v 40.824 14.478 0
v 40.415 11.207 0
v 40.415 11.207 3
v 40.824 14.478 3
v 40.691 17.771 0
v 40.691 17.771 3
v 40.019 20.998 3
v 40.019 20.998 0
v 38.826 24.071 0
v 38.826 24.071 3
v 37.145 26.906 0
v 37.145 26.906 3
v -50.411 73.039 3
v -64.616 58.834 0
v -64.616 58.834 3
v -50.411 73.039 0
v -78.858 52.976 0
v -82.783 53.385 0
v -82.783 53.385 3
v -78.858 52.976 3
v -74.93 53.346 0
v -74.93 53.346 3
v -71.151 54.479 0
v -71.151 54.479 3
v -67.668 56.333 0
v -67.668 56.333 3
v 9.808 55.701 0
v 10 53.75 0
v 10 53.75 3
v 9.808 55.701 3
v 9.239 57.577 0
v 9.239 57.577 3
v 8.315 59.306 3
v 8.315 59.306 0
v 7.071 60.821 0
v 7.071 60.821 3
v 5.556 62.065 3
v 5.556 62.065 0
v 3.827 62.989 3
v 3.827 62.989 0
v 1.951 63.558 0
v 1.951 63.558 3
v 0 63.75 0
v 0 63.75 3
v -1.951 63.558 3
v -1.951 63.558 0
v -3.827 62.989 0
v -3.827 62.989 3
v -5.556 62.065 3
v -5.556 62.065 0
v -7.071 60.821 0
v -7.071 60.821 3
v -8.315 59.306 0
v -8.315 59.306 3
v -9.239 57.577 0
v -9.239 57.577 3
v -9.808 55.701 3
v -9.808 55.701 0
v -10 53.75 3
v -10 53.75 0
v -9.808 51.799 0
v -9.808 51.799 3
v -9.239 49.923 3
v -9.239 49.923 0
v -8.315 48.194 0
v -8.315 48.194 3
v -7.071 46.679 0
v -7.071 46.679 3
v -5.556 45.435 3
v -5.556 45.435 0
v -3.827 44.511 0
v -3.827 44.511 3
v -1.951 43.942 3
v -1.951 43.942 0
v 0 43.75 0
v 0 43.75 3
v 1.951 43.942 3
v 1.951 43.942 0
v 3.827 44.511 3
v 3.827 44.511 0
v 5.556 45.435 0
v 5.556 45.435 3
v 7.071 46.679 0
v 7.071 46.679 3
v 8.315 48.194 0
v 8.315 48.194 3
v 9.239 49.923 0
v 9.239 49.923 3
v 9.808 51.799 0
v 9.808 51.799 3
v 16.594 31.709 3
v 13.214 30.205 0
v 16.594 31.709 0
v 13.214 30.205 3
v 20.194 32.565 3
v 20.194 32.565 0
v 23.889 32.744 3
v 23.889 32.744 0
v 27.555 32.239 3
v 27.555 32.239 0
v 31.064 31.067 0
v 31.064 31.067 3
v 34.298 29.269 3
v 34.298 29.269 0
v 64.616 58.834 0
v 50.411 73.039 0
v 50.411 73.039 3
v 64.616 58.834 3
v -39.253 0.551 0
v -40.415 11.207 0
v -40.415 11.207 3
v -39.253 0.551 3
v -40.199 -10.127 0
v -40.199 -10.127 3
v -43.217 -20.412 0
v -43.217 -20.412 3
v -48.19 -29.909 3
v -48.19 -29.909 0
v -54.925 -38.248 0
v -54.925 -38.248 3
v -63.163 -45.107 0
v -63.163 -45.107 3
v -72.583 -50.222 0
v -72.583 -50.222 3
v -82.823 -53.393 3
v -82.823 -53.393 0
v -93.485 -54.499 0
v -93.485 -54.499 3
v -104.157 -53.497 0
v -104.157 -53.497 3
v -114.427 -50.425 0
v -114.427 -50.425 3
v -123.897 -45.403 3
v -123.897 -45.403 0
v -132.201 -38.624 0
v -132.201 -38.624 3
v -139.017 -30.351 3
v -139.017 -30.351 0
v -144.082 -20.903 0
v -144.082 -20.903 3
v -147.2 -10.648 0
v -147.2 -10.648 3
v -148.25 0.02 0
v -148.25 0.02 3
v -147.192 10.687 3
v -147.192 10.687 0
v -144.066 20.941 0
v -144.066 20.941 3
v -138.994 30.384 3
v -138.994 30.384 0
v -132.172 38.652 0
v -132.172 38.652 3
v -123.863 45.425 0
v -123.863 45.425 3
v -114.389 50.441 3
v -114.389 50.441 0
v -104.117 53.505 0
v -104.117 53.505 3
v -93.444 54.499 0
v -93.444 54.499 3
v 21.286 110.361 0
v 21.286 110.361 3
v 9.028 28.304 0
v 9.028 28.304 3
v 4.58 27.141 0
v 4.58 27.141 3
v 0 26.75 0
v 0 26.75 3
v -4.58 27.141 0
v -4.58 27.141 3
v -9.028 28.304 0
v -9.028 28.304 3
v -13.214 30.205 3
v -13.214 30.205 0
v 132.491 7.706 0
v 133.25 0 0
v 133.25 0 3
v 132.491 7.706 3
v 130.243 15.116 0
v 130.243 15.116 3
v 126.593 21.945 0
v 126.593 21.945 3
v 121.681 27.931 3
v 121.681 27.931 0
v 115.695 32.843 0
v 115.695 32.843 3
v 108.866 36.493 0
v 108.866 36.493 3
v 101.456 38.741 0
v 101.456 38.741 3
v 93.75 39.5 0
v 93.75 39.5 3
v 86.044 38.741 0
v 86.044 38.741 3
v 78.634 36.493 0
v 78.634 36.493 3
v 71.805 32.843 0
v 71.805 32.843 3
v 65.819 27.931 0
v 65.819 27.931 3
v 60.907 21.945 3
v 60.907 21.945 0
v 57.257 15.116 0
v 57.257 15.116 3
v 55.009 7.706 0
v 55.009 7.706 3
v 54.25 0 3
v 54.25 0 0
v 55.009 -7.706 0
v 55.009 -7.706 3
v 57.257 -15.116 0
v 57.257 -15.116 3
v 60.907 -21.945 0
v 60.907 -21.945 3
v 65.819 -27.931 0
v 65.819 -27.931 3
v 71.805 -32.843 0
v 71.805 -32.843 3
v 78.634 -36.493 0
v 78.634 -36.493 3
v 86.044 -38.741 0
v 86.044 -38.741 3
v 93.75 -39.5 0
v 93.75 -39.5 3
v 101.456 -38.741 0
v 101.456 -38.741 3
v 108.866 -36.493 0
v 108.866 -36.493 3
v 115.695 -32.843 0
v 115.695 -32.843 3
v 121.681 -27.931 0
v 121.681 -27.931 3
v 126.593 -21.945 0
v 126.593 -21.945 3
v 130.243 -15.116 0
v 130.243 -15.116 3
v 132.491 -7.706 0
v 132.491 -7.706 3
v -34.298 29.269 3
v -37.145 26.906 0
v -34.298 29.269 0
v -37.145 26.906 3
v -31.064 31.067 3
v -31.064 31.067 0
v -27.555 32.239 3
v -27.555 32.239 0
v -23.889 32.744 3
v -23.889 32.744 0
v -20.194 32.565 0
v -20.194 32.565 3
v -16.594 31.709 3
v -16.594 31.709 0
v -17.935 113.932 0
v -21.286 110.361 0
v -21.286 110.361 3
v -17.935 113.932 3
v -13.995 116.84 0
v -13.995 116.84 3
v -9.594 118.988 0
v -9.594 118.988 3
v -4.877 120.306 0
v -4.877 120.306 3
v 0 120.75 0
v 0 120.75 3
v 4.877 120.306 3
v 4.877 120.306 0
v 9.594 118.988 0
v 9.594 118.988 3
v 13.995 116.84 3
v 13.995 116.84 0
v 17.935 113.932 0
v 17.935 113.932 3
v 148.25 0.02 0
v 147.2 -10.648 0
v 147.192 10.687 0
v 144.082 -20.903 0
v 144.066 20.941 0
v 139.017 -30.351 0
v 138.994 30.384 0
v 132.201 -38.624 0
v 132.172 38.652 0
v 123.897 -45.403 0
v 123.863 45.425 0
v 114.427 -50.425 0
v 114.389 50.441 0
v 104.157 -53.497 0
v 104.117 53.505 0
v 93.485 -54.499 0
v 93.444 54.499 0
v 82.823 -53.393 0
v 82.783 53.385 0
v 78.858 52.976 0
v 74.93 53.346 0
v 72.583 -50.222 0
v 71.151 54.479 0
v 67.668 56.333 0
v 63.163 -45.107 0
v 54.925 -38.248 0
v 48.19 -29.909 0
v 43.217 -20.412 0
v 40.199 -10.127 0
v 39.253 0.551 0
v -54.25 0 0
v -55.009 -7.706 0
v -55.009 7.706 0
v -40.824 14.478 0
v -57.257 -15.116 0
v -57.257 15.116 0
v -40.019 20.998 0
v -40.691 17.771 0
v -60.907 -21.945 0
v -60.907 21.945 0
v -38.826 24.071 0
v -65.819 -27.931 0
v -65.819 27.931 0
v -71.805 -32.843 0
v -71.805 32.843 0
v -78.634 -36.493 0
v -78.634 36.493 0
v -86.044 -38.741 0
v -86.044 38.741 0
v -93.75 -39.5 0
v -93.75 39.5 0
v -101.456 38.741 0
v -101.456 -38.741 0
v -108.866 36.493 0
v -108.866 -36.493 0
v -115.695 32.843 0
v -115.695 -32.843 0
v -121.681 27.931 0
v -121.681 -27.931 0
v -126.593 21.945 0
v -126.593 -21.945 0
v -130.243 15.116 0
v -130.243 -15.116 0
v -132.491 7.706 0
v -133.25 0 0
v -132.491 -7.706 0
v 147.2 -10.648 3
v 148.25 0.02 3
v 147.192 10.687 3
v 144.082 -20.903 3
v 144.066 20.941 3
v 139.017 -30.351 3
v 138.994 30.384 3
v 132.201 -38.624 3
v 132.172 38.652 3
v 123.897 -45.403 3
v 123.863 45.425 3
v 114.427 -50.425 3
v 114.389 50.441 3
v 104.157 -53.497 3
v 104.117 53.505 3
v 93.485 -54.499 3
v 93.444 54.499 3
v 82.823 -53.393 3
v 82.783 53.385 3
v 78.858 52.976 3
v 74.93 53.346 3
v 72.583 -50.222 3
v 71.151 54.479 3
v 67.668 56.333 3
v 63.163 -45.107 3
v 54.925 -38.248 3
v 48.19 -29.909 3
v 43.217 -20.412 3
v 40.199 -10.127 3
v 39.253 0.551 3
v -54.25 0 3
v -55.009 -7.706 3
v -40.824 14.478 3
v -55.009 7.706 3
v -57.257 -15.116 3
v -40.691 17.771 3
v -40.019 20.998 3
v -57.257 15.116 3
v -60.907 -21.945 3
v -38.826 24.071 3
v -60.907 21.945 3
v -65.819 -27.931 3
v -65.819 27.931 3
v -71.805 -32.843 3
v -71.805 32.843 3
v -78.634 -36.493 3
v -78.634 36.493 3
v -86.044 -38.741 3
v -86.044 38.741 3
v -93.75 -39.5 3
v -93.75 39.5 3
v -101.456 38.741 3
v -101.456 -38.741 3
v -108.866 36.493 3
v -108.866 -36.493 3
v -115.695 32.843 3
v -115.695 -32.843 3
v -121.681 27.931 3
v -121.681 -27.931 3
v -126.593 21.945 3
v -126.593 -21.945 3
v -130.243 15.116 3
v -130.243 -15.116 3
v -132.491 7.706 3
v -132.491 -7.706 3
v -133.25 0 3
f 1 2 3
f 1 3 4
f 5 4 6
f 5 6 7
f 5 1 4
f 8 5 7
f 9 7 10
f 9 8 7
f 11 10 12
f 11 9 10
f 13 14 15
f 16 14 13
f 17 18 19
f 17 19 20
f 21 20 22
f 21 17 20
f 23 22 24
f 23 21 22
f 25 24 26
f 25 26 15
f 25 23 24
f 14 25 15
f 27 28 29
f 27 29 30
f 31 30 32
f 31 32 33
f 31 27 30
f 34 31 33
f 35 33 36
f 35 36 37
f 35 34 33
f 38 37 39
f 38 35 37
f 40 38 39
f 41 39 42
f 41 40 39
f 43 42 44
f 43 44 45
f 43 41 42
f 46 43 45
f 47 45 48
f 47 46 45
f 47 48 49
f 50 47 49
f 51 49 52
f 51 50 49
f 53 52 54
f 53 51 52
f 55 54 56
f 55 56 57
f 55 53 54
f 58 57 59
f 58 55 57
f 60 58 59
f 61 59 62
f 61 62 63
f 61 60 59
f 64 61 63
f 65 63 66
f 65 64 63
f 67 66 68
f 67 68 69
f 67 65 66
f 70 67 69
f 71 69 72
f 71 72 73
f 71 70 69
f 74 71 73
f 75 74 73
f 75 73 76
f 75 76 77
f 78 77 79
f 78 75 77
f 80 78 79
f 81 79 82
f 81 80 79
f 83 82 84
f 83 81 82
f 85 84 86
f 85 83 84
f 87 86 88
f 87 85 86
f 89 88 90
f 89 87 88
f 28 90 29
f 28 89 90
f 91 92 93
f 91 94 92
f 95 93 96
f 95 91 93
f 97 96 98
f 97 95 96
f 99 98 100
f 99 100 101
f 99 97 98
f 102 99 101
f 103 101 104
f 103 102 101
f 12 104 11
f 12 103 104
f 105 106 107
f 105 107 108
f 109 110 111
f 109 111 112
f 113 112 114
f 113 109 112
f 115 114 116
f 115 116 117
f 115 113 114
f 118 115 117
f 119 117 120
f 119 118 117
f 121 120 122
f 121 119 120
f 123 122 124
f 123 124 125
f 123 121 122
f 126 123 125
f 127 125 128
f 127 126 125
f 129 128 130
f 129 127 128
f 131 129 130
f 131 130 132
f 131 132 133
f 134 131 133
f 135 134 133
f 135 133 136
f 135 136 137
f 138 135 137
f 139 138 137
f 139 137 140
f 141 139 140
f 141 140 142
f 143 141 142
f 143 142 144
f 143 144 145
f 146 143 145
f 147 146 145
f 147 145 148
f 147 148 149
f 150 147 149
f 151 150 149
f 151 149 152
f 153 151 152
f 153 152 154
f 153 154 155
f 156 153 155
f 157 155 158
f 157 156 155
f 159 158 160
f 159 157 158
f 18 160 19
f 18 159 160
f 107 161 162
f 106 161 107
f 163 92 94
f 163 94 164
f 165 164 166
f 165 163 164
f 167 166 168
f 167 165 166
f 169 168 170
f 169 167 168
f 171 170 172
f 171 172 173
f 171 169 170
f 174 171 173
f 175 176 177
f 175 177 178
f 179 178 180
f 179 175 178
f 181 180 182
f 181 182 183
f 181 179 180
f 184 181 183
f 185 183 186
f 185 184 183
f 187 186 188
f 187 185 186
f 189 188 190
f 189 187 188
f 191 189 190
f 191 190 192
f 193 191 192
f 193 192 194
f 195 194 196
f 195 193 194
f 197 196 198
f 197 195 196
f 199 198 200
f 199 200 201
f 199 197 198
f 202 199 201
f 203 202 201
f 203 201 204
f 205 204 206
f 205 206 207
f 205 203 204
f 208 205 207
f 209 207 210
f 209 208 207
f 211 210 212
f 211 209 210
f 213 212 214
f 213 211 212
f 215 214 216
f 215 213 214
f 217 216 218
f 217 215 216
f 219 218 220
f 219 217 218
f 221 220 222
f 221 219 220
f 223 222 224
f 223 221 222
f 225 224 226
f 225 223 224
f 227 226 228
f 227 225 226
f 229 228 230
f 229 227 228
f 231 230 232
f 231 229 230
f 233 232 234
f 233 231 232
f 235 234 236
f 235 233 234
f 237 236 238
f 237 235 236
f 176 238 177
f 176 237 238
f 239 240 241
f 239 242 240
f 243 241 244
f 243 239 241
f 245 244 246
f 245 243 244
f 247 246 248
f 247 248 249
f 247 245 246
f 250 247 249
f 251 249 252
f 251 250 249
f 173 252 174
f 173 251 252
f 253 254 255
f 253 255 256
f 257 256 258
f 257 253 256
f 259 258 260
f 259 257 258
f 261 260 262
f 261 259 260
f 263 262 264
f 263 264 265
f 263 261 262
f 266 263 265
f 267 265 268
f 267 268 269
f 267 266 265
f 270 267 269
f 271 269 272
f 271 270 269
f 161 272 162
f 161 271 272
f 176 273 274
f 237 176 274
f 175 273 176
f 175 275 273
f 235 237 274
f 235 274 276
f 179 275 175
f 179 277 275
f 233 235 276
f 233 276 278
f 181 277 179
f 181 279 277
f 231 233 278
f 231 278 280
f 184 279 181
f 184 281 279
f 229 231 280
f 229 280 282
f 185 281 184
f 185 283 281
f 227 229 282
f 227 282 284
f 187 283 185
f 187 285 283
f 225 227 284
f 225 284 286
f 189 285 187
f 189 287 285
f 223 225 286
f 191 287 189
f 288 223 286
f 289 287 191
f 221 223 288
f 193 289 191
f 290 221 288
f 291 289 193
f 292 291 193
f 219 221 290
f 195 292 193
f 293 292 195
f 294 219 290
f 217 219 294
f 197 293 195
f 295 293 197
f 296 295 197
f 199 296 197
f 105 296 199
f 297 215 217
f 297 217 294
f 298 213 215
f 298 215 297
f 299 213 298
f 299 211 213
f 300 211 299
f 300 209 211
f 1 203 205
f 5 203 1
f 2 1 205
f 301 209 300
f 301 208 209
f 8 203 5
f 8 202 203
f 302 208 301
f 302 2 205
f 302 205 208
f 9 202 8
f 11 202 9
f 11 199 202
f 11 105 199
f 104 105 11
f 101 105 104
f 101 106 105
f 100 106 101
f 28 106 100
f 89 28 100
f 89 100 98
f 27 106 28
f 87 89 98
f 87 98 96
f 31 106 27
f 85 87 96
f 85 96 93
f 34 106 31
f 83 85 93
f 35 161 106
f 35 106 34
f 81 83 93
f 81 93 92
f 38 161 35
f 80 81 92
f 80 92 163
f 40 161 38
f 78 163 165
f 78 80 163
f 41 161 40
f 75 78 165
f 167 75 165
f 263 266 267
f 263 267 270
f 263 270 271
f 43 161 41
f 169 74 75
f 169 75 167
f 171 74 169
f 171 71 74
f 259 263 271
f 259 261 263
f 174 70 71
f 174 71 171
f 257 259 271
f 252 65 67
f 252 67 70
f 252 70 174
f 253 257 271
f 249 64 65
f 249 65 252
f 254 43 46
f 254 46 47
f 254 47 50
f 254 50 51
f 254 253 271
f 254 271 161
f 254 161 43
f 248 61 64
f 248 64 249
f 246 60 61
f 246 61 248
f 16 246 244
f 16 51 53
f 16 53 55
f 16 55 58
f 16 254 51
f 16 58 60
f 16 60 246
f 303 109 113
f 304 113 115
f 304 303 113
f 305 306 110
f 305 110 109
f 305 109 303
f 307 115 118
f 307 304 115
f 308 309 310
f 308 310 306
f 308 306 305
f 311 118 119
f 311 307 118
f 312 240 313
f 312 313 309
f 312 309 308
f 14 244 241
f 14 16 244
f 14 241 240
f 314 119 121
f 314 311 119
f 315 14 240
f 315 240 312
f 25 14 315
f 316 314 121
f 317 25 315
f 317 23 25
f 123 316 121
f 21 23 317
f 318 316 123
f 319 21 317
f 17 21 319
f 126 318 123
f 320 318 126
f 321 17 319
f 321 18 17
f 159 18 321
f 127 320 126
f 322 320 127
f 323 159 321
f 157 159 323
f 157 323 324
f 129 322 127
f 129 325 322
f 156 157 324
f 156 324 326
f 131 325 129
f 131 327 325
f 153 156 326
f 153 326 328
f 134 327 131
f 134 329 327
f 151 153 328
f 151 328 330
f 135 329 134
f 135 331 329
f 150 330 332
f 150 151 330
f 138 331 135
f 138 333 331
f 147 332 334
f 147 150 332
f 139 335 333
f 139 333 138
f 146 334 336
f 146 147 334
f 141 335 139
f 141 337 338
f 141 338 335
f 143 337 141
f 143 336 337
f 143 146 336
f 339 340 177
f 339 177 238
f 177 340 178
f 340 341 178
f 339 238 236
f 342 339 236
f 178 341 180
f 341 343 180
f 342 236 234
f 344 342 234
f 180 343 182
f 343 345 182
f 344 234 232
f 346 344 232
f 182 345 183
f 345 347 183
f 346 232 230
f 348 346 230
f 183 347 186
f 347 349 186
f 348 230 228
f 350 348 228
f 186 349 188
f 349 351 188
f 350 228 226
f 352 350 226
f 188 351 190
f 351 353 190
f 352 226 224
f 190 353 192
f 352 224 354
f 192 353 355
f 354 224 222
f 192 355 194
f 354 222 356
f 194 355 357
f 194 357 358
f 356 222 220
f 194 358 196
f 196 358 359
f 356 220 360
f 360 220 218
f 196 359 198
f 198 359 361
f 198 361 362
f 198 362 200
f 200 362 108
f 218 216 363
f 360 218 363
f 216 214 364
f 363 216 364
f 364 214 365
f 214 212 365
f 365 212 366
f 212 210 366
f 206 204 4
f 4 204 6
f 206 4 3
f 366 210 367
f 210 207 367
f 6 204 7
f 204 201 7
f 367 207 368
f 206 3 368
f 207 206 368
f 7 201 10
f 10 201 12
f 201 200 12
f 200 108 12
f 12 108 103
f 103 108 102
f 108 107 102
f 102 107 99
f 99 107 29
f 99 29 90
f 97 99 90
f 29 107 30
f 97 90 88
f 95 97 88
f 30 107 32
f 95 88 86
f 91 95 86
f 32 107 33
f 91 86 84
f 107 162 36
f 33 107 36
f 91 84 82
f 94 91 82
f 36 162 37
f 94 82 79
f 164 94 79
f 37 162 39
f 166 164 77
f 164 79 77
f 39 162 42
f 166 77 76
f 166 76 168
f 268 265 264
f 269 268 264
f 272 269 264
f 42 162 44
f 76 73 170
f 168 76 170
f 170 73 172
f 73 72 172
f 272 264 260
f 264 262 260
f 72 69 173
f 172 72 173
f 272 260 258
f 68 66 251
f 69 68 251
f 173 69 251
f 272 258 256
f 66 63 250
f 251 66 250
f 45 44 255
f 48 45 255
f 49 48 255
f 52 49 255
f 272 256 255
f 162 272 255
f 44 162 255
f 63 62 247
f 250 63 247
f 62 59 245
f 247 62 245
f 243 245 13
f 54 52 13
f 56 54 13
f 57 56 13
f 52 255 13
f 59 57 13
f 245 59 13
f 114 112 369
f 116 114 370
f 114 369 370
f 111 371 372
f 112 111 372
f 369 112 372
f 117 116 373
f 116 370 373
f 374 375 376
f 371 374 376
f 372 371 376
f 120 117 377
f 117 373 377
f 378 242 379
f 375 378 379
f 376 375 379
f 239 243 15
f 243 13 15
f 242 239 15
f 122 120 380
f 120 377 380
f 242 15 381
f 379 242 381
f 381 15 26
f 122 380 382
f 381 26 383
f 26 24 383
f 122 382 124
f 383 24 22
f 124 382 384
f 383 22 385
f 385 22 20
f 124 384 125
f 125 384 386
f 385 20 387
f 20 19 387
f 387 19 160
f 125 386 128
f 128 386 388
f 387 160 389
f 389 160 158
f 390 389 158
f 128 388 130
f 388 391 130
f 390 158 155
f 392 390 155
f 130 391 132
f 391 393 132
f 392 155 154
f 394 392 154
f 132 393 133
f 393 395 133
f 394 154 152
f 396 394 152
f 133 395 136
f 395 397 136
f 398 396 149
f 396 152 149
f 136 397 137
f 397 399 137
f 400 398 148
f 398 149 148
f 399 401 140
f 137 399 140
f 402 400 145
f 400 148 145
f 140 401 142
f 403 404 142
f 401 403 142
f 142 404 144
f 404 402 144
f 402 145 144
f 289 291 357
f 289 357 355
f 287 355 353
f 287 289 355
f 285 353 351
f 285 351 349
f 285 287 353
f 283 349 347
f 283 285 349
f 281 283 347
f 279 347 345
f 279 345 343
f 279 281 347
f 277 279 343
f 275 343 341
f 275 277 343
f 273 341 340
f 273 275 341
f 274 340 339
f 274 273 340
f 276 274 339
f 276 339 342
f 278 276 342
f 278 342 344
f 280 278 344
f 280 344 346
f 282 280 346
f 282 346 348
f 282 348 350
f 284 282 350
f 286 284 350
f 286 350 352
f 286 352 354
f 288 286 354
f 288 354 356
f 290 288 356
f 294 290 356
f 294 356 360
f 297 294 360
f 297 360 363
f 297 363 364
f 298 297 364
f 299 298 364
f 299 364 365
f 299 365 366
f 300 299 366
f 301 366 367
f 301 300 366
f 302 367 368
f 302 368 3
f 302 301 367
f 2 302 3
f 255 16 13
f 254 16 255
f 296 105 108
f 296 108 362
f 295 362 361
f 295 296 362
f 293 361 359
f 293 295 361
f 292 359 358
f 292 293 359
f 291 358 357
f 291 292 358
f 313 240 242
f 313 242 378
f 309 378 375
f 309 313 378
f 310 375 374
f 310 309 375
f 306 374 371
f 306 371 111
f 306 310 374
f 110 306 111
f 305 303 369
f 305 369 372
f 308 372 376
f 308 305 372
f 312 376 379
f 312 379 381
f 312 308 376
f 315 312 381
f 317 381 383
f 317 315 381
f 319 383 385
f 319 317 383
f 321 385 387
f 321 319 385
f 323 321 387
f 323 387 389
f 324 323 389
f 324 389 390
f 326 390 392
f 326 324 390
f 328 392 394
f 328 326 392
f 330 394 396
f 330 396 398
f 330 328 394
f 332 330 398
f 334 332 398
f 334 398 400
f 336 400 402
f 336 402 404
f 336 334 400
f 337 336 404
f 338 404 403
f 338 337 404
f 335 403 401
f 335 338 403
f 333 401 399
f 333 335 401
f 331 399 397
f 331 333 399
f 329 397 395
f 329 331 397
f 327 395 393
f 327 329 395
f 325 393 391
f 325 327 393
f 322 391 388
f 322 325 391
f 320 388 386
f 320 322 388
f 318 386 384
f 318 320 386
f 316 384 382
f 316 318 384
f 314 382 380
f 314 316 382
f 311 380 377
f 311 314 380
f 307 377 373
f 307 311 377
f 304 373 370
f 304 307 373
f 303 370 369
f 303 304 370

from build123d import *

# Parameters (mm, degrees)
SKETCH_1_R      = 39.5
SKETCH_1_R_2    = 10
EXTRUDE_1_DEPTH = 3
FILLET_1_R      = 20
FILLET_2_R      = 20


with BuildPart() as part:
    # Эскиз1 → Бобышка-Вытянуть1 (new body)
    with BuildSketch(Plane.XY):
        with BuildLine():
            Line((-73.038609064, 50.411192066), (-50.411192066, 73.038609064))
            Line((-50.411192066, 73.038609064), (-21.285640845, 110.360884799))
            ThreePointArc((-21.285640845, 110.360884799), (0, 120.75), (21.285640845, 110.360884799))
            Line((21.285640845, 110.360884799), (50.411192066, 73.038609064))
            Line((50.411192066, 73.038609064), (73.038609064, 50.411192066))
            ThreePointArc((73.038609064, 50.411192066), (132.287319575, -38.537319575), (43.338807934, 20.711390936))
            Line((43.338807934, 20.711390936), (23.534235961, 40.515962909))
            ThreePointArc((23.534235961, 40.515962909), (0, 26.75), (-23.534235961, 40.515962909))
            Line((-23.534235961, 40.515962909), (-43.338807934, 20.711390936))
            ThreePointArc((-43.338807934, 20.711390936), (-132.287319575, -38.537319575), (-73.038609064, 50.411192066))
        make_face()
        with Locations((-93.75, 0)):
            Circle(SKETCH_1_R, mode=Mode.SUBTRACT)
        with Locations((93.75, 0)):
            Circle(SKETCH_1_R, mode=Mode.SUBTRACT)
        with Locations((0, 53.75)):
            Circle(SKETCH_1_R_2, mode=Mode.SUBTRACT)
    extrude(amount=EXTRUDE_1_DEPTH)

    # Скругление1
    fillet_1_edges = [part.edges().sort_by_distance(p)[0] for p in [
        (23.534235961, 40.515962909, 1.5),
        (-23.534235961, 40.515962909, 1.5),
    ]]
    fillet(fillet_1_edges, radius=FILLET_1_R)

    # Скругление2
    # the kernel refuses this fillet: 20 mm, written as the material it adds along each edge
    with BuildSketch(Plane(origin=(73.038609064, 50.411192066, 0), x_dir=(0.9564465824657693, 0.29190740807583243, 0), z_dir=(0, 0, 1))) as fillet_2_piece_1:
        with BuildLine():
            CenterArc((12.057212621, 19.912448006), FILLET_2_R, 208.027815678, 56.6091051)
            Line((-5.59717882, 10.514444874), (-5.950266649, 10.326484811))
            Line((-5.950266649, 10.326484811), (-0.353087829, -0.187960063))
            Line((-0.353087829, -0.187960063), (0.037386706, -0.39824896))
            ThreePointArc((0.037386706, -0.39824896), (5.093938665, -0.161420815), (10.150490625, -0.39824896))
            Line((10.150490625, -0.39824896), (10.187877331, 0))
        make_face()
    extrude(amount=3)
    with BuildSketch(Plane(origin=(-73.038609064, 50.411192066, 0), x_dir=(-0.9564465824657701, 0.2919074080758299, 0), z_dir=(0, 0, 1))) as fillet_2_piece_2:
        with BuildLine():
            CenterArc((12.057212621, -19.912448006), FILLET_2_R, 95.363079222, 56.6091051)
            Line((-5.59717882, -10.514444874), (-5.950266649, -10.326484811))
            Line((-5.950266649, -10.326484811), (-0.353087829, 0.187960063))
            Line((-0.353087829, 0.187960063), (0.037386706, 0.39824896))
            ThreePointArc((0.037386706, 0.39824896), (5.093938665, 0.161420815), (10.150490625, 0.39824896))
            Line((10.150490625, 0.39824896), (10.187877331, 0))
        make_face()
    extrude(amount=3)
    with BuildSketch(Plane(origin=(43.338807934, 20.711390936, 0), x_dir=(-0.7071067811865486, 0.7071067811865466, 0), z_dir=(0, 0, 1))) as fillet_2_piece_3:
        with BuildLine():
            CenterArc((12.095099349, 19.719973869), FILLET_2_R, 213.13333953, 47.267573146)
            Line((-4.652916781, 8.788187386), (-4.987877104, 8.569551657))
            ThreePointArc((-4.987877104, 8.569551657), (-2.479115111, 4.313269402), (-0.369110171, -0.154135272))
            Line((-0.369110171, -0.154135272), (0, -0.4))
            ThreePointArc((0, -0.4), (4.380019269, -0.4), (8.693337321, -0.394399477))
            Line((8.693337321, -0.394399477), (8.760038538, 0))
        make_face()
    extrude(amount=3)
    with BuildSketch(Plane(origin=(-43.338807934, 20.711390936, 0), x_dir=(0.7071067811865474, 0.7071067811865477, 0), z_dir=(0, 0, 1))) as fillet_2_piece_4:
        with BuildLine():
            CenterArc((12.095099349, -19.719973869), FILLET_2_R, 99.599087325, 47.267573146)
            Line((-4.652916781, -8.788187386), (-4.987877104, -8.569551657))
            ThreePointArc((-4.987877104, -8.569551657), (-2.479115111, -4.313269402), (-0.369110171, 0.154135272))
            Line((-0.369110171, 0.154135272), (0, 0.4))
            ThreePointArc((0, 0.4), (4.380019269, 0.4), (8.693337321, 0.394399477))
            Line((8.693337321, 0.394399477), (8.760038538, 0))
        make_face()
    extrude(amount=3)


solid = part.part
